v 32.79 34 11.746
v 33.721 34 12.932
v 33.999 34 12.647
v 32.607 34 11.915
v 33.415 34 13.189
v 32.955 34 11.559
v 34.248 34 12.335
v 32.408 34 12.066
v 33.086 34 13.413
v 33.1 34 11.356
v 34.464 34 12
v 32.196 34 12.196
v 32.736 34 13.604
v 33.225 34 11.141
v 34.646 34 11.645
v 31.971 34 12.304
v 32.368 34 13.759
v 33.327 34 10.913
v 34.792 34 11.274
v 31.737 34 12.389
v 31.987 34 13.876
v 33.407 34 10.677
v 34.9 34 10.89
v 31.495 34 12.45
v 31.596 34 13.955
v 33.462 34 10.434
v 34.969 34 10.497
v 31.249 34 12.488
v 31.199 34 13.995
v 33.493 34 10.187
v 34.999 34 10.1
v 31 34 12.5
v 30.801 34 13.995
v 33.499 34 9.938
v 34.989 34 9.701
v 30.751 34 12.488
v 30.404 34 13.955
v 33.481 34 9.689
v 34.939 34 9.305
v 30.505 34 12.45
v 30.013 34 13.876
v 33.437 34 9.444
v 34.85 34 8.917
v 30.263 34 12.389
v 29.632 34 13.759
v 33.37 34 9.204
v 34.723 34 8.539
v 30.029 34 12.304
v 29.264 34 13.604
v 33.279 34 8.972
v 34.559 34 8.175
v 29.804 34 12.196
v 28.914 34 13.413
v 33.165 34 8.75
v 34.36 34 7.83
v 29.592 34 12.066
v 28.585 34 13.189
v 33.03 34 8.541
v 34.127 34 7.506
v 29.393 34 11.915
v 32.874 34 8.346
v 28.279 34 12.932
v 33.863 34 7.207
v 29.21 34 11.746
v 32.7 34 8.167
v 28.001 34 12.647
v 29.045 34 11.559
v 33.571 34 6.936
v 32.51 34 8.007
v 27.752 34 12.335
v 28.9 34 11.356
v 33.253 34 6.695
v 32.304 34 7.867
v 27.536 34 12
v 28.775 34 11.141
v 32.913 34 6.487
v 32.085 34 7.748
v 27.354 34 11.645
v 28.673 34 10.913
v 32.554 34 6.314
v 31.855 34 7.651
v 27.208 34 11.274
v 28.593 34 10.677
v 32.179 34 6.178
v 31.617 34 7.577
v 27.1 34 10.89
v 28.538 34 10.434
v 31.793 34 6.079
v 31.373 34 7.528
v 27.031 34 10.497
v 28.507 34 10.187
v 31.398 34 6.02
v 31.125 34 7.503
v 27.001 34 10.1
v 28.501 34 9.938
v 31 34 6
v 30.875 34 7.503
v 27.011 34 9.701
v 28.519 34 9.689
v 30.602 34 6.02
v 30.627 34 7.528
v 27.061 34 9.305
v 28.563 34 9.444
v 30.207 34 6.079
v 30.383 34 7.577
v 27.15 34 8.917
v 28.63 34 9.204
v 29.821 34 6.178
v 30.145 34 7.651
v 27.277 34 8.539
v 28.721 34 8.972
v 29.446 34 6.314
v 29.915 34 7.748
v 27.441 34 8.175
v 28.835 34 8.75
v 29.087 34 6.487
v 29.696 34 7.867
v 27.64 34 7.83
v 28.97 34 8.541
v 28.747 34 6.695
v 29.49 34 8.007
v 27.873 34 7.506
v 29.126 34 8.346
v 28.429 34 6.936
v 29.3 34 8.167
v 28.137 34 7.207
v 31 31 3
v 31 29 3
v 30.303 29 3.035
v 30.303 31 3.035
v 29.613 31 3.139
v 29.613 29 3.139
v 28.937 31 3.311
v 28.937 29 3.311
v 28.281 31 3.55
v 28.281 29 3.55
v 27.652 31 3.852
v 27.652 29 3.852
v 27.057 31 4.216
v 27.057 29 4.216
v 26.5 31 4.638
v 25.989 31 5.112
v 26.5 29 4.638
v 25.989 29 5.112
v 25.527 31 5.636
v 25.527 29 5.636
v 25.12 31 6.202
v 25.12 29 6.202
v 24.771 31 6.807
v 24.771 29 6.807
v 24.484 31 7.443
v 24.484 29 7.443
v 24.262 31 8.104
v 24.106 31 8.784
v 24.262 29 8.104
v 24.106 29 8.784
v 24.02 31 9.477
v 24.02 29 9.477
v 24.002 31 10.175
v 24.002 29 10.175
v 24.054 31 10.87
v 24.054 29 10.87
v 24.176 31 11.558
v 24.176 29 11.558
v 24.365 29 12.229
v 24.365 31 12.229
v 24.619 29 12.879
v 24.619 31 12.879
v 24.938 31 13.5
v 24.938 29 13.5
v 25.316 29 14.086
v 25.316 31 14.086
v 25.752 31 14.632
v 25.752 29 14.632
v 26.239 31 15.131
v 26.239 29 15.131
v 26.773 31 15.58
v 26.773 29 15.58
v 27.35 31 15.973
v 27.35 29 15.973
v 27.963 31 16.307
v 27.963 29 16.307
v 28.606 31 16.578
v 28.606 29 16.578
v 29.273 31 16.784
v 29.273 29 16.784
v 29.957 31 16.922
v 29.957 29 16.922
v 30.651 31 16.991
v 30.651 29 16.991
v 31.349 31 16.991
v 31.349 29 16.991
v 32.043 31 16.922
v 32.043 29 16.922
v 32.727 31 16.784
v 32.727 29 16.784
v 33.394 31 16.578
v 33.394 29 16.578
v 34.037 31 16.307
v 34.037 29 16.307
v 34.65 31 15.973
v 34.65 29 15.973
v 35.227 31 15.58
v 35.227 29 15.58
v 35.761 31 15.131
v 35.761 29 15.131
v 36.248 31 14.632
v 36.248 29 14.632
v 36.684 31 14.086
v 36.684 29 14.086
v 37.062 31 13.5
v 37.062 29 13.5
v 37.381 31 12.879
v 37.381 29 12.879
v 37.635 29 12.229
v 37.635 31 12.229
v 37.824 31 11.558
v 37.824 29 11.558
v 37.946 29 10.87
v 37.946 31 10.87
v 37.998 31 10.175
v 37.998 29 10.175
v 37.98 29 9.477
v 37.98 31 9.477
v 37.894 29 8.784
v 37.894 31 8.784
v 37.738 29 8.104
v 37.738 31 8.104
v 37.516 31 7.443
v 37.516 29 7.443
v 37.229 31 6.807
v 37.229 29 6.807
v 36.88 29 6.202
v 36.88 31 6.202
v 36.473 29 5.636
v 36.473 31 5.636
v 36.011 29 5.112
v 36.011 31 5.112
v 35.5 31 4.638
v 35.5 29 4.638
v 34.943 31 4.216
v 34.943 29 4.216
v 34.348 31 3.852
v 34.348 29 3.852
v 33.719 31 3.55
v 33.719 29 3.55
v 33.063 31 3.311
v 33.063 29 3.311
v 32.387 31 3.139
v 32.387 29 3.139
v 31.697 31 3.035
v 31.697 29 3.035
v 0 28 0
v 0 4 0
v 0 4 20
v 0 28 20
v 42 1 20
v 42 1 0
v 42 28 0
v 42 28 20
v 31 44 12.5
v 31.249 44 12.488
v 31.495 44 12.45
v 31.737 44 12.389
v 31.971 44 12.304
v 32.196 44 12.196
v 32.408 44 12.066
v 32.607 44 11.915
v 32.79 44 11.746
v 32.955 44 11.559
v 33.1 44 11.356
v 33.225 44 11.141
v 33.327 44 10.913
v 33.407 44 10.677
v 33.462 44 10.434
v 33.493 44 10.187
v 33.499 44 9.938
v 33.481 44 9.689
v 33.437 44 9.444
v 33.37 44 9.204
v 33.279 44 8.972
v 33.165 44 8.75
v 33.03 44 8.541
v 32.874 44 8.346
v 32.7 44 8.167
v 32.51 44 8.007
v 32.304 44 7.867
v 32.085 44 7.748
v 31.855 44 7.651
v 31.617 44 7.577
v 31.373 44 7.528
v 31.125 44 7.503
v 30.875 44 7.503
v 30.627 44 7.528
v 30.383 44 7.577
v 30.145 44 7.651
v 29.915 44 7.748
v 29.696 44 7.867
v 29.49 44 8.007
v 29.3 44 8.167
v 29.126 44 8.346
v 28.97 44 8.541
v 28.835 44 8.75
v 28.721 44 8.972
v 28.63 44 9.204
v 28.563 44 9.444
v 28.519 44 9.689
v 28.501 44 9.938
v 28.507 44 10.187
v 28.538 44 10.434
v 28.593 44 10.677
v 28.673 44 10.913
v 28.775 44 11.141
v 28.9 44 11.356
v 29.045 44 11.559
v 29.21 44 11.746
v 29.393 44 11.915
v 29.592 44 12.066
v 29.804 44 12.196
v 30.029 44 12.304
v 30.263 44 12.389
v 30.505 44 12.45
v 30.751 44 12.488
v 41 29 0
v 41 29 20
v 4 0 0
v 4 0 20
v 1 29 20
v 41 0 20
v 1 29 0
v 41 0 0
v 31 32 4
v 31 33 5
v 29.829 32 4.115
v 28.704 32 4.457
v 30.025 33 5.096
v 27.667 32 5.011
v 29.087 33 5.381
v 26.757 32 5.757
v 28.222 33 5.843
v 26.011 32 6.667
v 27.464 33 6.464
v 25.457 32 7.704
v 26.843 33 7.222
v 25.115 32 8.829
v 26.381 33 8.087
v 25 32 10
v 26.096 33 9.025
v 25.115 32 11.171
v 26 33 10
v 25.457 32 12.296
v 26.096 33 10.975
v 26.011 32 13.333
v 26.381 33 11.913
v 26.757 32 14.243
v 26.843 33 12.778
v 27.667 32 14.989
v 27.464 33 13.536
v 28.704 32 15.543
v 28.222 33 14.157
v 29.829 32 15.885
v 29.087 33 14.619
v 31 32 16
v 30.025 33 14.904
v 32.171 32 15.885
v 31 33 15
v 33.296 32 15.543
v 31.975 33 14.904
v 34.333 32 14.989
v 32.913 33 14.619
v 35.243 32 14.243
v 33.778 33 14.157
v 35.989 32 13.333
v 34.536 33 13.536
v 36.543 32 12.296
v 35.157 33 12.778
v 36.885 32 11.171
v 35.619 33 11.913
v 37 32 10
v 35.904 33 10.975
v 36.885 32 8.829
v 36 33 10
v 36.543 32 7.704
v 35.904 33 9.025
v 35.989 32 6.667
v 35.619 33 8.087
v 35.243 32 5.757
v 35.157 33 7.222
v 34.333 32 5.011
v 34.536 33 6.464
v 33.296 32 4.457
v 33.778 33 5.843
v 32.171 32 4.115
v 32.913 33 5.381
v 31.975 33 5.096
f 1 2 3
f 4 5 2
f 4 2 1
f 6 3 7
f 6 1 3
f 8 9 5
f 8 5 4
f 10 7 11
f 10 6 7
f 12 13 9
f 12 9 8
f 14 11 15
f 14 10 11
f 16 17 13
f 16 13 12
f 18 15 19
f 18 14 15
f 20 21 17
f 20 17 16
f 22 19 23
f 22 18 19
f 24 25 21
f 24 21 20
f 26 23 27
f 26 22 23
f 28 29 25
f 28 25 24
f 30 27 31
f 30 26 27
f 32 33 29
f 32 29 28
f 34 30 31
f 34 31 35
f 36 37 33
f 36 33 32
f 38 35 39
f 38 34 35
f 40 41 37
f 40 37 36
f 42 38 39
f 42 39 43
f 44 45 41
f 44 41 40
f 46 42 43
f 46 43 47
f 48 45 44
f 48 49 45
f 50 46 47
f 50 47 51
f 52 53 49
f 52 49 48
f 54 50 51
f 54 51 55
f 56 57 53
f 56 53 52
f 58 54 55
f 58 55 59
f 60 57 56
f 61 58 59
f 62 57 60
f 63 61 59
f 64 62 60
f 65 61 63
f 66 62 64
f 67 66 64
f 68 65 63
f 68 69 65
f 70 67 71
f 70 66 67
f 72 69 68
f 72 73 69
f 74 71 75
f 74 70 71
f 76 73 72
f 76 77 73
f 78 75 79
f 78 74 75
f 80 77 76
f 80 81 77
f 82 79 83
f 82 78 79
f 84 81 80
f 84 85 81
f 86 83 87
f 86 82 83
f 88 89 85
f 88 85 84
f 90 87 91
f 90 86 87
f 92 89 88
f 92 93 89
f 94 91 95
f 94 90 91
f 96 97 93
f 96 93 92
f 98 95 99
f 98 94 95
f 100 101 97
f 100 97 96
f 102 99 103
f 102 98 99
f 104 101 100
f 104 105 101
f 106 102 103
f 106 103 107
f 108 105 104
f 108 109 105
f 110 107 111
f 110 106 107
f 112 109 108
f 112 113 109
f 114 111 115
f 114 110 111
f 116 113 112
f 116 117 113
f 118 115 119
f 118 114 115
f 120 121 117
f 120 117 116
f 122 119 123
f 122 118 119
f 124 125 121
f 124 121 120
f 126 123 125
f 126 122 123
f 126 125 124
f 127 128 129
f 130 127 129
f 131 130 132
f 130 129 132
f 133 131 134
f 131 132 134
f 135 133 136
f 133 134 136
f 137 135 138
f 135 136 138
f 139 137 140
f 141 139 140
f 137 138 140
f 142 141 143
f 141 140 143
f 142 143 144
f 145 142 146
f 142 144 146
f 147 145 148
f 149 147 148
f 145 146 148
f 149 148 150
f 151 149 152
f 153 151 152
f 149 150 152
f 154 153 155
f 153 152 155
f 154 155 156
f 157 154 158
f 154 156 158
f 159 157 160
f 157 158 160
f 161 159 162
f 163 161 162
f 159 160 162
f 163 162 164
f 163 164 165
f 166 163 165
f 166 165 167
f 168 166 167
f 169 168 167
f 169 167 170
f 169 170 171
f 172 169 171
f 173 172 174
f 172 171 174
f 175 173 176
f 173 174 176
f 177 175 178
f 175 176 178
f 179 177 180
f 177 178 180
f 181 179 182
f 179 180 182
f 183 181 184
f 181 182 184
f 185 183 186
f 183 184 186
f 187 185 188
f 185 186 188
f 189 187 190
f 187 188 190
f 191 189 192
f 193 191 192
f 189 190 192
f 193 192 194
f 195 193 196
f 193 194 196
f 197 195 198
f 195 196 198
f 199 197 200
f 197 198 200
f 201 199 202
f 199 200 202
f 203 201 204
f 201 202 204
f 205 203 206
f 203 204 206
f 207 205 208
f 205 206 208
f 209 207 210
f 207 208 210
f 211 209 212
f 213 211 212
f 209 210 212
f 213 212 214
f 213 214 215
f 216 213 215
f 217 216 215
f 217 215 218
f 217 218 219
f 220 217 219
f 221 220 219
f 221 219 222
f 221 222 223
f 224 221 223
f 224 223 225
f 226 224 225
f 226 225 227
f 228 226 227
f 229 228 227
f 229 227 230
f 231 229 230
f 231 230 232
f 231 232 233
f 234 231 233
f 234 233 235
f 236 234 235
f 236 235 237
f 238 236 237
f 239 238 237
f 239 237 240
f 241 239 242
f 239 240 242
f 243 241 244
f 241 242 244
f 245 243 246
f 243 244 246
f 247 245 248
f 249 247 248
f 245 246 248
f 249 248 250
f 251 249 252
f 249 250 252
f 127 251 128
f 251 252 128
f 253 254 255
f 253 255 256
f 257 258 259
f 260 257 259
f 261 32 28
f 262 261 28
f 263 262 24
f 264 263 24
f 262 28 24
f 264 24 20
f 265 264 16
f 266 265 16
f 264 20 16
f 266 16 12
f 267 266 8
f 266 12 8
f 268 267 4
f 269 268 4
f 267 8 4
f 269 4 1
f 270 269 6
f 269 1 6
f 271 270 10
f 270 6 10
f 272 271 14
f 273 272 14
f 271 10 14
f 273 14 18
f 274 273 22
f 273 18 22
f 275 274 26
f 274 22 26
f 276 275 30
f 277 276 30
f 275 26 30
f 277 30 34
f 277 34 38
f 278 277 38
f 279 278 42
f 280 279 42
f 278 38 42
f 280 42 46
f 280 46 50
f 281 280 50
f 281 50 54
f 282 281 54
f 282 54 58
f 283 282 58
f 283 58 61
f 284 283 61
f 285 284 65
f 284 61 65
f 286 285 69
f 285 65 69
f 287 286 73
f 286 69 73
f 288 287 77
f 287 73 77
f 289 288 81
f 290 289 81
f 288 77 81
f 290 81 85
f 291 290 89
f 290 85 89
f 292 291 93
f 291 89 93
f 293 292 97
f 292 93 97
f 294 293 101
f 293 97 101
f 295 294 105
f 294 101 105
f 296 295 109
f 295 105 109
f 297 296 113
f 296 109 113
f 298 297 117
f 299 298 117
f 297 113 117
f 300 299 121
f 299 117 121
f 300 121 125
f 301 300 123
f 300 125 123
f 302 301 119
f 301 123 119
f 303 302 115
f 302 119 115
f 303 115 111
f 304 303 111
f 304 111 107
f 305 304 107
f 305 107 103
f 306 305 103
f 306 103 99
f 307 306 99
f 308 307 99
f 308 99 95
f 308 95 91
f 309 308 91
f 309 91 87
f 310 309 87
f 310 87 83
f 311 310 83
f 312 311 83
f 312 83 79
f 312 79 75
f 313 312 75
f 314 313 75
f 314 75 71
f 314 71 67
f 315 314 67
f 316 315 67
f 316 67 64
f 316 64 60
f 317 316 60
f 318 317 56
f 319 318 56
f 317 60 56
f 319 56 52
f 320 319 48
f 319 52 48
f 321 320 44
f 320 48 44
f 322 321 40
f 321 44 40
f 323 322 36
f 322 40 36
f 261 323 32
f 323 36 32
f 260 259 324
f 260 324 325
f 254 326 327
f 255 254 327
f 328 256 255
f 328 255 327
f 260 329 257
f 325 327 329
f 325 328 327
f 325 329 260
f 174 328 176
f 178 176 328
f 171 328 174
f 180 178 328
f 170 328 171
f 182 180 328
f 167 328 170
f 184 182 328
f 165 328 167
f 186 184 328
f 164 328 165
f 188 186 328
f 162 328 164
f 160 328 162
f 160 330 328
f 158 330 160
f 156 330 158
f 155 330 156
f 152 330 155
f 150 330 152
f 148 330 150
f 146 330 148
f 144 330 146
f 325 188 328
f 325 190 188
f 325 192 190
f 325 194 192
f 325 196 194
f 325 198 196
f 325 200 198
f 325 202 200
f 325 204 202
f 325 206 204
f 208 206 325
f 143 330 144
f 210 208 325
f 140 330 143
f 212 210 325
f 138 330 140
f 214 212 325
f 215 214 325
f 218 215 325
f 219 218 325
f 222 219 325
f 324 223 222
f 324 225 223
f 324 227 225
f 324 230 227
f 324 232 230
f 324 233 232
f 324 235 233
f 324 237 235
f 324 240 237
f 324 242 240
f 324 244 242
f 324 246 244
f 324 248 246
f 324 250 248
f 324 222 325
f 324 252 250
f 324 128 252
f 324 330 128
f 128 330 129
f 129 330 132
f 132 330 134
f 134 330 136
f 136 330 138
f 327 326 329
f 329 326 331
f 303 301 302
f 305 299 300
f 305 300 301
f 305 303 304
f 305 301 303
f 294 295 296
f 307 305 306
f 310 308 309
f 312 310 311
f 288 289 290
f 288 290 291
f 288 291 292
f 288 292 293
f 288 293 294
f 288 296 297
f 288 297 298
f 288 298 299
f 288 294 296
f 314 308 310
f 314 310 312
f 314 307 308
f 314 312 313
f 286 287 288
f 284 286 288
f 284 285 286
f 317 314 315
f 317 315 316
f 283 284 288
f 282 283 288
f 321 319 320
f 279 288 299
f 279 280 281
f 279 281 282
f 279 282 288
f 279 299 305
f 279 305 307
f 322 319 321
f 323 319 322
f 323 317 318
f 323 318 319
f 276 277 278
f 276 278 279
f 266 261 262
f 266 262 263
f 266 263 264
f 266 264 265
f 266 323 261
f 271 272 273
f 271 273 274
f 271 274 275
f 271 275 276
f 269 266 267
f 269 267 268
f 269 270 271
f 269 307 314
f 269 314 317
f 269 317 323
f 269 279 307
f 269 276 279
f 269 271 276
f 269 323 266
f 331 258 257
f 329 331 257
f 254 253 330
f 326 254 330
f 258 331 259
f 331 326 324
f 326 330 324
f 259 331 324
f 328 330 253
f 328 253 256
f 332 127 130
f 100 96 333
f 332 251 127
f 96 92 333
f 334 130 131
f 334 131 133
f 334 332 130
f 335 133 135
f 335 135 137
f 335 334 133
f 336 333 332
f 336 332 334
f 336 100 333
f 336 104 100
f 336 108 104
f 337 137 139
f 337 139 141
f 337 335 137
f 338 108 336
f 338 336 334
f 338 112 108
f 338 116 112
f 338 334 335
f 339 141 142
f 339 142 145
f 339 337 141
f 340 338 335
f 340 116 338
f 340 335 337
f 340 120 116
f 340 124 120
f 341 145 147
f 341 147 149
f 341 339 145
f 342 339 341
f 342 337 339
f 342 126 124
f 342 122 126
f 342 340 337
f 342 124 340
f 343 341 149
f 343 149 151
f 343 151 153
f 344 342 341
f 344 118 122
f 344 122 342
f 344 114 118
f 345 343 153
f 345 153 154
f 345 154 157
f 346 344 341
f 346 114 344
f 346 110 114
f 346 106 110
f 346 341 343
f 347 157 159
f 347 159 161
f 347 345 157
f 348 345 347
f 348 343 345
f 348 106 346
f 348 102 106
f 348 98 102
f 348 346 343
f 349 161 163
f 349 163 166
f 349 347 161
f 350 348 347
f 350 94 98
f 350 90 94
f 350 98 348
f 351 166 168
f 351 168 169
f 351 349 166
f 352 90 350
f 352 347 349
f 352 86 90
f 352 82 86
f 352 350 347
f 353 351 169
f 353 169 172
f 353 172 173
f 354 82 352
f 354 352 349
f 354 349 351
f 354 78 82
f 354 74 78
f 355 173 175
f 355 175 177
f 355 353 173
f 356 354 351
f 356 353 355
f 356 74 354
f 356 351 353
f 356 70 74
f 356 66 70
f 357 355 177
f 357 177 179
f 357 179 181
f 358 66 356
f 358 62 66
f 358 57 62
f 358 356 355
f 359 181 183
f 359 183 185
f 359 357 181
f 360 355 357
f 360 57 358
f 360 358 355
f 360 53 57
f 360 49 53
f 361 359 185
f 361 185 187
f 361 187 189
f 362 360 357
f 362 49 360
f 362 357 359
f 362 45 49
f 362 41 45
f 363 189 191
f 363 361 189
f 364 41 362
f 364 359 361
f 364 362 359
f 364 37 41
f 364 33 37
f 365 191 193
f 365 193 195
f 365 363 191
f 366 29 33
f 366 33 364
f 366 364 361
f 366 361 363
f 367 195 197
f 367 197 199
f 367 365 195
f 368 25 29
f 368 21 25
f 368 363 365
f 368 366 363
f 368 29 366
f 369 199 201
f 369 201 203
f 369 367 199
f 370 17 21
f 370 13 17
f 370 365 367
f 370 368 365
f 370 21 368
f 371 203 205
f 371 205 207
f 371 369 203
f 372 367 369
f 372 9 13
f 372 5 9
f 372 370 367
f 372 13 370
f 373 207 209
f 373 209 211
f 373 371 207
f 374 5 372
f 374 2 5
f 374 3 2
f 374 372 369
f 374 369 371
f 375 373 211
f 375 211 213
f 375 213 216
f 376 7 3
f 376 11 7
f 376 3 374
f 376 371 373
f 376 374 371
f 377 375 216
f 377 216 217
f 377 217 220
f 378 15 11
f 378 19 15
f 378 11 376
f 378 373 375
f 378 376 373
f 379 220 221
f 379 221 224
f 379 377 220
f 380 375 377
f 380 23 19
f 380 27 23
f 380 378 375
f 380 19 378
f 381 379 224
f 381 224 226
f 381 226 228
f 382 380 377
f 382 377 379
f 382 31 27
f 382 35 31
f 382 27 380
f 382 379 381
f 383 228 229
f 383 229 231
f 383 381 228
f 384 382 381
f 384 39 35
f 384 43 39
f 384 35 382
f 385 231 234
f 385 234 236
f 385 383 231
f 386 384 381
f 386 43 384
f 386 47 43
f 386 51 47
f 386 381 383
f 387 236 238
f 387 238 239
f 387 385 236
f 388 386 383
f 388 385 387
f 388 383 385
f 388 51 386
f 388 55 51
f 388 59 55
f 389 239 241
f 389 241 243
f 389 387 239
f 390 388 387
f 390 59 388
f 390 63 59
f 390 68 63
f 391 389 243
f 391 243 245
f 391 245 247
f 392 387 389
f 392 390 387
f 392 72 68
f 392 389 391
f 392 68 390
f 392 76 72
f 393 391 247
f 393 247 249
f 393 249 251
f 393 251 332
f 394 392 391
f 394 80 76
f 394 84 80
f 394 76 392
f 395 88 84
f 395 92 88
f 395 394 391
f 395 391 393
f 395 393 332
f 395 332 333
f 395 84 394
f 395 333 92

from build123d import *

# Parameters (mm, degrees)
SKETCH1_W           = 42
SKETCH1_H           = 29
BOSS_EXTRUDE1_DEPTH = 20
CHAMFER1_SIZE       = 4
CHAMFER2_SIZE       = 1
CHAMFER3_SIZE       = 1
SKETCH4_R           = 7
BOSS_EXTRUDE2_DEPTH = 5
CHAMFER4_SIZE       = 3
SKETCH5_R           = 2.5
BOSS_EXTRUDE3_DEPTH = 10


with BuildPart() as part:
    # Sketch1 → Boss-Extrude1 (new body)
    with BuildSketch(Plane.XY):
        with Locations((21, 14.5)):
            Rectangle(SKETCH1_W, SKETCH1_H)
    extrude(amount=BOSS_EXTRUDE1_DEPTH)

    # Chamfer1
    chamfer1_edges = [part.edges().sort_by_distance(p)[0] for p in [
        (0, 0, 10),
    ]]
    chamfer(chamfer1_edges, length=CHAMFER1_SIZE)

    # Chamfer2
    chamfer2_edges = [part.edges().sort_by_distance(p)[0] for p in [
        (0, 29, 10),
        (42, 29, 10),
    ]]
    chamfer(chamfer2_edges, length=CHAMFER2_SIZE)

    # Chamfer3
    chamfer3_edges = [part.edges().sort_by_distance(p)[0] for p in [
        (42, 0, 10),
    ]]
    chamfer(chamfer3_edges, length=CHAMFER3_SIZE)

    # Sketch4 → Boss-Extrude2 (add)
    with BuildSketch(Plane(origin=(0, 29, 0), x_dir=(1, 0, 0), z_dir=(0, 1, 0))):
        with Locations(Location((31, -10, 0), (0, 0, 90))):
            Circle(SKETCH4_R)
    extrude(amount=BOSS_EXTRUDE2_DEPTH)

    # Chamfer4
    chamfer4_edges = [part.edges().sort_by_distance(p)[0] for p in [
        (31, 34, 17),
    ]]
    chamfer(chamfer4_edges, length=CHAMFER4_SIZE)

    # Sketch5 → Boss-Extrude3 (add)
    with BuildSketch(Plane(origin=(0, 34, 0), x_dir=(1, 0, 0), z_dir=(0, 1, 0))):
        with Locations(Location((31, -10, 0), (0, 0, 270))):
            Circle(SKETCH5_R)
    extrude(amount=BOSS_EXTRUDE3_DEPTH)


solid = part.part
